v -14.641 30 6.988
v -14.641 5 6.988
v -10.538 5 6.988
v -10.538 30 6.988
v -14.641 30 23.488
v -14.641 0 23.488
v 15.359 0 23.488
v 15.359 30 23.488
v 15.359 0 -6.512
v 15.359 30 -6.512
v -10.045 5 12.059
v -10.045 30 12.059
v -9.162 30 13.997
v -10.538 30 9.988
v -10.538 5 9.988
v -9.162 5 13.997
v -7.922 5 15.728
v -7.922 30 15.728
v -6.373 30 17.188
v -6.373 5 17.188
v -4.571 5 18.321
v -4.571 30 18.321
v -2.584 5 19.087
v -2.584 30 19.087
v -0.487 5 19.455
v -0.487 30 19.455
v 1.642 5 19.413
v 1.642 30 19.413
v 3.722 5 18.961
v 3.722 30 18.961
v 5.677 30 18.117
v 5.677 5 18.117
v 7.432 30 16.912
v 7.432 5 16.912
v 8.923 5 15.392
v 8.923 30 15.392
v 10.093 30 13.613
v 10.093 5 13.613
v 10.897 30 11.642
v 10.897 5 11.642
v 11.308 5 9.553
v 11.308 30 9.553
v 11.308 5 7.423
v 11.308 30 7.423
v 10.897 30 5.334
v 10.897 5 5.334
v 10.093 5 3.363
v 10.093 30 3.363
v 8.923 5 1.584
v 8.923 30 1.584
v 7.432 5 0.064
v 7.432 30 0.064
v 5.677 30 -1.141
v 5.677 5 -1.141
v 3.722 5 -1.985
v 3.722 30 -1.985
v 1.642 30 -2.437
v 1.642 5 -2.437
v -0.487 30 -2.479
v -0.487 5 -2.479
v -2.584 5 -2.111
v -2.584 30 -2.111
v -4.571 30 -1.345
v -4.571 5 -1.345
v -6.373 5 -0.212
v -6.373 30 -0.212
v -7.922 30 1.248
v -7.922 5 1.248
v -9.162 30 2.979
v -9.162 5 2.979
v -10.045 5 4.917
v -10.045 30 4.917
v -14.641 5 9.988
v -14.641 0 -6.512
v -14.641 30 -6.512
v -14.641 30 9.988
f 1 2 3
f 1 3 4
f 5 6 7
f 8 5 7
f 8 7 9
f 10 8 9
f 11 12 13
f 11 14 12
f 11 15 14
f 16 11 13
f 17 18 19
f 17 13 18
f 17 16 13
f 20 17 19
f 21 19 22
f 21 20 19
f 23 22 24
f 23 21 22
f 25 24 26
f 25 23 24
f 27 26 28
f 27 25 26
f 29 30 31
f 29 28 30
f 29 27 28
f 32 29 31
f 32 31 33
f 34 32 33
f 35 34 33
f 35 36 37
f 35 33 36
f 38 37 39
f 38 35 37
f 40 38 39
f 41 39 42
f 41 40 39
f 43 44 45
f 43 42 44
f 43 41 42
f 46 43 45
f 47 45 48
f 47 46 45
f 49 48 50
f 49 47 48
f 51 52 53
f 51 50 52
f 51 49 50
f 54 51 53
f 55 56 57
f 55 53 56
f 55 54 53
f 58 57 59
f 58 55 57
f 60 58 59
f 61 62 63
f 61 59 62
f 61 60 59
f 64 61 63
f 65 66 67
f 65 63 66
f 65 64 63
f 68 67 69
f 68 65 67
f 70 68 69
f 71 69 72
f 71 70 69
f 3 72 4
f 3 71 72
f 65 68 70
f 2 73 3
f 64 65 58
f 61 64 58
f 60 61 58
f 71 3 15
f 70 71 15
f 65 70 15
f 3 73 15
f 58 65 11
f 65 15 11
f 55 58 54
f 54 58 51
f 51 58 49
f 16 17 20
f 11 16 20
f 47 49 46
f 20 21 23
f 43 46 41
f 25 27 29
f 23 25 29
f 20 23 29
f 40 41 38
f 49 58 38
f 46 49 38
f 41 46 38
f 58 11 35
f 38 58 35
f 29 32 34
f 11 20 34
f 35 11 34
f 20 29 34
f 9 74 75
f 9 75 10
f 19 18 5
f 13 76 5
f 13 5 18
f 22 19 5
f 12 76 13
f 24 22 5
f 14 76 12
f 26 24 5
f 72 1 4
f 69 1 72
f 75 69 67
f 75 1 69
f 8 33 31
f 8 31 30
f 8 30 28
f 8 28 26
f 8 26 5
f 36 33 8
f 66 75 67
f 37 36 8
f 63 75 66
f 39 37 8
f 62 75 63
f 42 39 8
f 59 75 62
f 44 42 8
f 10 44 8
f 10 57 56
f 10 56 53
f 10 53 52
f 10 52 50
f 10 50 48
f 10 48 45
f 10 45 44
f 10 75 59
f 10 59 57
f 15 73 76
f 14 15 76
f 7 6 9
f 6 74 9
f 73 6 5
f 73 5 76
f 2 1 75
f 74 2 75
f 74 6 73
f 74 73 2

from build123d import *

# Parameters (mm, degrees)
SKETCH1_W           = 30
SKETCH1_H           = 30
SKETCH1_R           = 11
BOSS_EXTRUDE1_DEPTH = 30
SKETCH2_W           = 3
SKETCH2_H           = 30
CUT_EXTRUDE1_DEPTH  = 11
SKETCH4_W           = 30
SKETCH4_H           = 30
BOSS_EXTRUDE3_DEPTH = 5


with BuildPart() as part:
    # Sketch1 → Boss-Extrude1 (new body)
    with BuildSketch(Plane(origin=(0, 0, 0), x_dir=(1, 0, 0), z_dir=(0, 1, 0))):
        with Locations((0.359281437, -8.488023952)):
            Rectangle(SKETCH1_W, SKETCH1_H)
        with Locations((0.359281437, -8.488023952)):
            Circle(SKETCH1_R, mode=Mode.SUBTRACT)
    extrude(amount=BOSS_EXTRUDE1_DEPTH)

    # Sketch2 → Cut-Extrude1 (cut)
    with BuildSketch(Plane.ZY.offset(14.640718563)):
        with Locations((8.488023952, 15)):
            Rectangle(SKETCH2_W, SKETCH2_H)
    extrude(amount=-CUT_EXTRUDE1_DEPTH, mode=Mode.SUBTRACT)

    # Sketch4 → Boss-Extrude3 (add)
    with BuildSketch(Plane.XZ):
        with Locations((0.359281437, 8.488023952)):
            Rectangle(SKETCH4_W, SKETCH4_H)
    extrude(amount=-BOSS_EXTRUDE3_DEPTH)


solid = part.part
